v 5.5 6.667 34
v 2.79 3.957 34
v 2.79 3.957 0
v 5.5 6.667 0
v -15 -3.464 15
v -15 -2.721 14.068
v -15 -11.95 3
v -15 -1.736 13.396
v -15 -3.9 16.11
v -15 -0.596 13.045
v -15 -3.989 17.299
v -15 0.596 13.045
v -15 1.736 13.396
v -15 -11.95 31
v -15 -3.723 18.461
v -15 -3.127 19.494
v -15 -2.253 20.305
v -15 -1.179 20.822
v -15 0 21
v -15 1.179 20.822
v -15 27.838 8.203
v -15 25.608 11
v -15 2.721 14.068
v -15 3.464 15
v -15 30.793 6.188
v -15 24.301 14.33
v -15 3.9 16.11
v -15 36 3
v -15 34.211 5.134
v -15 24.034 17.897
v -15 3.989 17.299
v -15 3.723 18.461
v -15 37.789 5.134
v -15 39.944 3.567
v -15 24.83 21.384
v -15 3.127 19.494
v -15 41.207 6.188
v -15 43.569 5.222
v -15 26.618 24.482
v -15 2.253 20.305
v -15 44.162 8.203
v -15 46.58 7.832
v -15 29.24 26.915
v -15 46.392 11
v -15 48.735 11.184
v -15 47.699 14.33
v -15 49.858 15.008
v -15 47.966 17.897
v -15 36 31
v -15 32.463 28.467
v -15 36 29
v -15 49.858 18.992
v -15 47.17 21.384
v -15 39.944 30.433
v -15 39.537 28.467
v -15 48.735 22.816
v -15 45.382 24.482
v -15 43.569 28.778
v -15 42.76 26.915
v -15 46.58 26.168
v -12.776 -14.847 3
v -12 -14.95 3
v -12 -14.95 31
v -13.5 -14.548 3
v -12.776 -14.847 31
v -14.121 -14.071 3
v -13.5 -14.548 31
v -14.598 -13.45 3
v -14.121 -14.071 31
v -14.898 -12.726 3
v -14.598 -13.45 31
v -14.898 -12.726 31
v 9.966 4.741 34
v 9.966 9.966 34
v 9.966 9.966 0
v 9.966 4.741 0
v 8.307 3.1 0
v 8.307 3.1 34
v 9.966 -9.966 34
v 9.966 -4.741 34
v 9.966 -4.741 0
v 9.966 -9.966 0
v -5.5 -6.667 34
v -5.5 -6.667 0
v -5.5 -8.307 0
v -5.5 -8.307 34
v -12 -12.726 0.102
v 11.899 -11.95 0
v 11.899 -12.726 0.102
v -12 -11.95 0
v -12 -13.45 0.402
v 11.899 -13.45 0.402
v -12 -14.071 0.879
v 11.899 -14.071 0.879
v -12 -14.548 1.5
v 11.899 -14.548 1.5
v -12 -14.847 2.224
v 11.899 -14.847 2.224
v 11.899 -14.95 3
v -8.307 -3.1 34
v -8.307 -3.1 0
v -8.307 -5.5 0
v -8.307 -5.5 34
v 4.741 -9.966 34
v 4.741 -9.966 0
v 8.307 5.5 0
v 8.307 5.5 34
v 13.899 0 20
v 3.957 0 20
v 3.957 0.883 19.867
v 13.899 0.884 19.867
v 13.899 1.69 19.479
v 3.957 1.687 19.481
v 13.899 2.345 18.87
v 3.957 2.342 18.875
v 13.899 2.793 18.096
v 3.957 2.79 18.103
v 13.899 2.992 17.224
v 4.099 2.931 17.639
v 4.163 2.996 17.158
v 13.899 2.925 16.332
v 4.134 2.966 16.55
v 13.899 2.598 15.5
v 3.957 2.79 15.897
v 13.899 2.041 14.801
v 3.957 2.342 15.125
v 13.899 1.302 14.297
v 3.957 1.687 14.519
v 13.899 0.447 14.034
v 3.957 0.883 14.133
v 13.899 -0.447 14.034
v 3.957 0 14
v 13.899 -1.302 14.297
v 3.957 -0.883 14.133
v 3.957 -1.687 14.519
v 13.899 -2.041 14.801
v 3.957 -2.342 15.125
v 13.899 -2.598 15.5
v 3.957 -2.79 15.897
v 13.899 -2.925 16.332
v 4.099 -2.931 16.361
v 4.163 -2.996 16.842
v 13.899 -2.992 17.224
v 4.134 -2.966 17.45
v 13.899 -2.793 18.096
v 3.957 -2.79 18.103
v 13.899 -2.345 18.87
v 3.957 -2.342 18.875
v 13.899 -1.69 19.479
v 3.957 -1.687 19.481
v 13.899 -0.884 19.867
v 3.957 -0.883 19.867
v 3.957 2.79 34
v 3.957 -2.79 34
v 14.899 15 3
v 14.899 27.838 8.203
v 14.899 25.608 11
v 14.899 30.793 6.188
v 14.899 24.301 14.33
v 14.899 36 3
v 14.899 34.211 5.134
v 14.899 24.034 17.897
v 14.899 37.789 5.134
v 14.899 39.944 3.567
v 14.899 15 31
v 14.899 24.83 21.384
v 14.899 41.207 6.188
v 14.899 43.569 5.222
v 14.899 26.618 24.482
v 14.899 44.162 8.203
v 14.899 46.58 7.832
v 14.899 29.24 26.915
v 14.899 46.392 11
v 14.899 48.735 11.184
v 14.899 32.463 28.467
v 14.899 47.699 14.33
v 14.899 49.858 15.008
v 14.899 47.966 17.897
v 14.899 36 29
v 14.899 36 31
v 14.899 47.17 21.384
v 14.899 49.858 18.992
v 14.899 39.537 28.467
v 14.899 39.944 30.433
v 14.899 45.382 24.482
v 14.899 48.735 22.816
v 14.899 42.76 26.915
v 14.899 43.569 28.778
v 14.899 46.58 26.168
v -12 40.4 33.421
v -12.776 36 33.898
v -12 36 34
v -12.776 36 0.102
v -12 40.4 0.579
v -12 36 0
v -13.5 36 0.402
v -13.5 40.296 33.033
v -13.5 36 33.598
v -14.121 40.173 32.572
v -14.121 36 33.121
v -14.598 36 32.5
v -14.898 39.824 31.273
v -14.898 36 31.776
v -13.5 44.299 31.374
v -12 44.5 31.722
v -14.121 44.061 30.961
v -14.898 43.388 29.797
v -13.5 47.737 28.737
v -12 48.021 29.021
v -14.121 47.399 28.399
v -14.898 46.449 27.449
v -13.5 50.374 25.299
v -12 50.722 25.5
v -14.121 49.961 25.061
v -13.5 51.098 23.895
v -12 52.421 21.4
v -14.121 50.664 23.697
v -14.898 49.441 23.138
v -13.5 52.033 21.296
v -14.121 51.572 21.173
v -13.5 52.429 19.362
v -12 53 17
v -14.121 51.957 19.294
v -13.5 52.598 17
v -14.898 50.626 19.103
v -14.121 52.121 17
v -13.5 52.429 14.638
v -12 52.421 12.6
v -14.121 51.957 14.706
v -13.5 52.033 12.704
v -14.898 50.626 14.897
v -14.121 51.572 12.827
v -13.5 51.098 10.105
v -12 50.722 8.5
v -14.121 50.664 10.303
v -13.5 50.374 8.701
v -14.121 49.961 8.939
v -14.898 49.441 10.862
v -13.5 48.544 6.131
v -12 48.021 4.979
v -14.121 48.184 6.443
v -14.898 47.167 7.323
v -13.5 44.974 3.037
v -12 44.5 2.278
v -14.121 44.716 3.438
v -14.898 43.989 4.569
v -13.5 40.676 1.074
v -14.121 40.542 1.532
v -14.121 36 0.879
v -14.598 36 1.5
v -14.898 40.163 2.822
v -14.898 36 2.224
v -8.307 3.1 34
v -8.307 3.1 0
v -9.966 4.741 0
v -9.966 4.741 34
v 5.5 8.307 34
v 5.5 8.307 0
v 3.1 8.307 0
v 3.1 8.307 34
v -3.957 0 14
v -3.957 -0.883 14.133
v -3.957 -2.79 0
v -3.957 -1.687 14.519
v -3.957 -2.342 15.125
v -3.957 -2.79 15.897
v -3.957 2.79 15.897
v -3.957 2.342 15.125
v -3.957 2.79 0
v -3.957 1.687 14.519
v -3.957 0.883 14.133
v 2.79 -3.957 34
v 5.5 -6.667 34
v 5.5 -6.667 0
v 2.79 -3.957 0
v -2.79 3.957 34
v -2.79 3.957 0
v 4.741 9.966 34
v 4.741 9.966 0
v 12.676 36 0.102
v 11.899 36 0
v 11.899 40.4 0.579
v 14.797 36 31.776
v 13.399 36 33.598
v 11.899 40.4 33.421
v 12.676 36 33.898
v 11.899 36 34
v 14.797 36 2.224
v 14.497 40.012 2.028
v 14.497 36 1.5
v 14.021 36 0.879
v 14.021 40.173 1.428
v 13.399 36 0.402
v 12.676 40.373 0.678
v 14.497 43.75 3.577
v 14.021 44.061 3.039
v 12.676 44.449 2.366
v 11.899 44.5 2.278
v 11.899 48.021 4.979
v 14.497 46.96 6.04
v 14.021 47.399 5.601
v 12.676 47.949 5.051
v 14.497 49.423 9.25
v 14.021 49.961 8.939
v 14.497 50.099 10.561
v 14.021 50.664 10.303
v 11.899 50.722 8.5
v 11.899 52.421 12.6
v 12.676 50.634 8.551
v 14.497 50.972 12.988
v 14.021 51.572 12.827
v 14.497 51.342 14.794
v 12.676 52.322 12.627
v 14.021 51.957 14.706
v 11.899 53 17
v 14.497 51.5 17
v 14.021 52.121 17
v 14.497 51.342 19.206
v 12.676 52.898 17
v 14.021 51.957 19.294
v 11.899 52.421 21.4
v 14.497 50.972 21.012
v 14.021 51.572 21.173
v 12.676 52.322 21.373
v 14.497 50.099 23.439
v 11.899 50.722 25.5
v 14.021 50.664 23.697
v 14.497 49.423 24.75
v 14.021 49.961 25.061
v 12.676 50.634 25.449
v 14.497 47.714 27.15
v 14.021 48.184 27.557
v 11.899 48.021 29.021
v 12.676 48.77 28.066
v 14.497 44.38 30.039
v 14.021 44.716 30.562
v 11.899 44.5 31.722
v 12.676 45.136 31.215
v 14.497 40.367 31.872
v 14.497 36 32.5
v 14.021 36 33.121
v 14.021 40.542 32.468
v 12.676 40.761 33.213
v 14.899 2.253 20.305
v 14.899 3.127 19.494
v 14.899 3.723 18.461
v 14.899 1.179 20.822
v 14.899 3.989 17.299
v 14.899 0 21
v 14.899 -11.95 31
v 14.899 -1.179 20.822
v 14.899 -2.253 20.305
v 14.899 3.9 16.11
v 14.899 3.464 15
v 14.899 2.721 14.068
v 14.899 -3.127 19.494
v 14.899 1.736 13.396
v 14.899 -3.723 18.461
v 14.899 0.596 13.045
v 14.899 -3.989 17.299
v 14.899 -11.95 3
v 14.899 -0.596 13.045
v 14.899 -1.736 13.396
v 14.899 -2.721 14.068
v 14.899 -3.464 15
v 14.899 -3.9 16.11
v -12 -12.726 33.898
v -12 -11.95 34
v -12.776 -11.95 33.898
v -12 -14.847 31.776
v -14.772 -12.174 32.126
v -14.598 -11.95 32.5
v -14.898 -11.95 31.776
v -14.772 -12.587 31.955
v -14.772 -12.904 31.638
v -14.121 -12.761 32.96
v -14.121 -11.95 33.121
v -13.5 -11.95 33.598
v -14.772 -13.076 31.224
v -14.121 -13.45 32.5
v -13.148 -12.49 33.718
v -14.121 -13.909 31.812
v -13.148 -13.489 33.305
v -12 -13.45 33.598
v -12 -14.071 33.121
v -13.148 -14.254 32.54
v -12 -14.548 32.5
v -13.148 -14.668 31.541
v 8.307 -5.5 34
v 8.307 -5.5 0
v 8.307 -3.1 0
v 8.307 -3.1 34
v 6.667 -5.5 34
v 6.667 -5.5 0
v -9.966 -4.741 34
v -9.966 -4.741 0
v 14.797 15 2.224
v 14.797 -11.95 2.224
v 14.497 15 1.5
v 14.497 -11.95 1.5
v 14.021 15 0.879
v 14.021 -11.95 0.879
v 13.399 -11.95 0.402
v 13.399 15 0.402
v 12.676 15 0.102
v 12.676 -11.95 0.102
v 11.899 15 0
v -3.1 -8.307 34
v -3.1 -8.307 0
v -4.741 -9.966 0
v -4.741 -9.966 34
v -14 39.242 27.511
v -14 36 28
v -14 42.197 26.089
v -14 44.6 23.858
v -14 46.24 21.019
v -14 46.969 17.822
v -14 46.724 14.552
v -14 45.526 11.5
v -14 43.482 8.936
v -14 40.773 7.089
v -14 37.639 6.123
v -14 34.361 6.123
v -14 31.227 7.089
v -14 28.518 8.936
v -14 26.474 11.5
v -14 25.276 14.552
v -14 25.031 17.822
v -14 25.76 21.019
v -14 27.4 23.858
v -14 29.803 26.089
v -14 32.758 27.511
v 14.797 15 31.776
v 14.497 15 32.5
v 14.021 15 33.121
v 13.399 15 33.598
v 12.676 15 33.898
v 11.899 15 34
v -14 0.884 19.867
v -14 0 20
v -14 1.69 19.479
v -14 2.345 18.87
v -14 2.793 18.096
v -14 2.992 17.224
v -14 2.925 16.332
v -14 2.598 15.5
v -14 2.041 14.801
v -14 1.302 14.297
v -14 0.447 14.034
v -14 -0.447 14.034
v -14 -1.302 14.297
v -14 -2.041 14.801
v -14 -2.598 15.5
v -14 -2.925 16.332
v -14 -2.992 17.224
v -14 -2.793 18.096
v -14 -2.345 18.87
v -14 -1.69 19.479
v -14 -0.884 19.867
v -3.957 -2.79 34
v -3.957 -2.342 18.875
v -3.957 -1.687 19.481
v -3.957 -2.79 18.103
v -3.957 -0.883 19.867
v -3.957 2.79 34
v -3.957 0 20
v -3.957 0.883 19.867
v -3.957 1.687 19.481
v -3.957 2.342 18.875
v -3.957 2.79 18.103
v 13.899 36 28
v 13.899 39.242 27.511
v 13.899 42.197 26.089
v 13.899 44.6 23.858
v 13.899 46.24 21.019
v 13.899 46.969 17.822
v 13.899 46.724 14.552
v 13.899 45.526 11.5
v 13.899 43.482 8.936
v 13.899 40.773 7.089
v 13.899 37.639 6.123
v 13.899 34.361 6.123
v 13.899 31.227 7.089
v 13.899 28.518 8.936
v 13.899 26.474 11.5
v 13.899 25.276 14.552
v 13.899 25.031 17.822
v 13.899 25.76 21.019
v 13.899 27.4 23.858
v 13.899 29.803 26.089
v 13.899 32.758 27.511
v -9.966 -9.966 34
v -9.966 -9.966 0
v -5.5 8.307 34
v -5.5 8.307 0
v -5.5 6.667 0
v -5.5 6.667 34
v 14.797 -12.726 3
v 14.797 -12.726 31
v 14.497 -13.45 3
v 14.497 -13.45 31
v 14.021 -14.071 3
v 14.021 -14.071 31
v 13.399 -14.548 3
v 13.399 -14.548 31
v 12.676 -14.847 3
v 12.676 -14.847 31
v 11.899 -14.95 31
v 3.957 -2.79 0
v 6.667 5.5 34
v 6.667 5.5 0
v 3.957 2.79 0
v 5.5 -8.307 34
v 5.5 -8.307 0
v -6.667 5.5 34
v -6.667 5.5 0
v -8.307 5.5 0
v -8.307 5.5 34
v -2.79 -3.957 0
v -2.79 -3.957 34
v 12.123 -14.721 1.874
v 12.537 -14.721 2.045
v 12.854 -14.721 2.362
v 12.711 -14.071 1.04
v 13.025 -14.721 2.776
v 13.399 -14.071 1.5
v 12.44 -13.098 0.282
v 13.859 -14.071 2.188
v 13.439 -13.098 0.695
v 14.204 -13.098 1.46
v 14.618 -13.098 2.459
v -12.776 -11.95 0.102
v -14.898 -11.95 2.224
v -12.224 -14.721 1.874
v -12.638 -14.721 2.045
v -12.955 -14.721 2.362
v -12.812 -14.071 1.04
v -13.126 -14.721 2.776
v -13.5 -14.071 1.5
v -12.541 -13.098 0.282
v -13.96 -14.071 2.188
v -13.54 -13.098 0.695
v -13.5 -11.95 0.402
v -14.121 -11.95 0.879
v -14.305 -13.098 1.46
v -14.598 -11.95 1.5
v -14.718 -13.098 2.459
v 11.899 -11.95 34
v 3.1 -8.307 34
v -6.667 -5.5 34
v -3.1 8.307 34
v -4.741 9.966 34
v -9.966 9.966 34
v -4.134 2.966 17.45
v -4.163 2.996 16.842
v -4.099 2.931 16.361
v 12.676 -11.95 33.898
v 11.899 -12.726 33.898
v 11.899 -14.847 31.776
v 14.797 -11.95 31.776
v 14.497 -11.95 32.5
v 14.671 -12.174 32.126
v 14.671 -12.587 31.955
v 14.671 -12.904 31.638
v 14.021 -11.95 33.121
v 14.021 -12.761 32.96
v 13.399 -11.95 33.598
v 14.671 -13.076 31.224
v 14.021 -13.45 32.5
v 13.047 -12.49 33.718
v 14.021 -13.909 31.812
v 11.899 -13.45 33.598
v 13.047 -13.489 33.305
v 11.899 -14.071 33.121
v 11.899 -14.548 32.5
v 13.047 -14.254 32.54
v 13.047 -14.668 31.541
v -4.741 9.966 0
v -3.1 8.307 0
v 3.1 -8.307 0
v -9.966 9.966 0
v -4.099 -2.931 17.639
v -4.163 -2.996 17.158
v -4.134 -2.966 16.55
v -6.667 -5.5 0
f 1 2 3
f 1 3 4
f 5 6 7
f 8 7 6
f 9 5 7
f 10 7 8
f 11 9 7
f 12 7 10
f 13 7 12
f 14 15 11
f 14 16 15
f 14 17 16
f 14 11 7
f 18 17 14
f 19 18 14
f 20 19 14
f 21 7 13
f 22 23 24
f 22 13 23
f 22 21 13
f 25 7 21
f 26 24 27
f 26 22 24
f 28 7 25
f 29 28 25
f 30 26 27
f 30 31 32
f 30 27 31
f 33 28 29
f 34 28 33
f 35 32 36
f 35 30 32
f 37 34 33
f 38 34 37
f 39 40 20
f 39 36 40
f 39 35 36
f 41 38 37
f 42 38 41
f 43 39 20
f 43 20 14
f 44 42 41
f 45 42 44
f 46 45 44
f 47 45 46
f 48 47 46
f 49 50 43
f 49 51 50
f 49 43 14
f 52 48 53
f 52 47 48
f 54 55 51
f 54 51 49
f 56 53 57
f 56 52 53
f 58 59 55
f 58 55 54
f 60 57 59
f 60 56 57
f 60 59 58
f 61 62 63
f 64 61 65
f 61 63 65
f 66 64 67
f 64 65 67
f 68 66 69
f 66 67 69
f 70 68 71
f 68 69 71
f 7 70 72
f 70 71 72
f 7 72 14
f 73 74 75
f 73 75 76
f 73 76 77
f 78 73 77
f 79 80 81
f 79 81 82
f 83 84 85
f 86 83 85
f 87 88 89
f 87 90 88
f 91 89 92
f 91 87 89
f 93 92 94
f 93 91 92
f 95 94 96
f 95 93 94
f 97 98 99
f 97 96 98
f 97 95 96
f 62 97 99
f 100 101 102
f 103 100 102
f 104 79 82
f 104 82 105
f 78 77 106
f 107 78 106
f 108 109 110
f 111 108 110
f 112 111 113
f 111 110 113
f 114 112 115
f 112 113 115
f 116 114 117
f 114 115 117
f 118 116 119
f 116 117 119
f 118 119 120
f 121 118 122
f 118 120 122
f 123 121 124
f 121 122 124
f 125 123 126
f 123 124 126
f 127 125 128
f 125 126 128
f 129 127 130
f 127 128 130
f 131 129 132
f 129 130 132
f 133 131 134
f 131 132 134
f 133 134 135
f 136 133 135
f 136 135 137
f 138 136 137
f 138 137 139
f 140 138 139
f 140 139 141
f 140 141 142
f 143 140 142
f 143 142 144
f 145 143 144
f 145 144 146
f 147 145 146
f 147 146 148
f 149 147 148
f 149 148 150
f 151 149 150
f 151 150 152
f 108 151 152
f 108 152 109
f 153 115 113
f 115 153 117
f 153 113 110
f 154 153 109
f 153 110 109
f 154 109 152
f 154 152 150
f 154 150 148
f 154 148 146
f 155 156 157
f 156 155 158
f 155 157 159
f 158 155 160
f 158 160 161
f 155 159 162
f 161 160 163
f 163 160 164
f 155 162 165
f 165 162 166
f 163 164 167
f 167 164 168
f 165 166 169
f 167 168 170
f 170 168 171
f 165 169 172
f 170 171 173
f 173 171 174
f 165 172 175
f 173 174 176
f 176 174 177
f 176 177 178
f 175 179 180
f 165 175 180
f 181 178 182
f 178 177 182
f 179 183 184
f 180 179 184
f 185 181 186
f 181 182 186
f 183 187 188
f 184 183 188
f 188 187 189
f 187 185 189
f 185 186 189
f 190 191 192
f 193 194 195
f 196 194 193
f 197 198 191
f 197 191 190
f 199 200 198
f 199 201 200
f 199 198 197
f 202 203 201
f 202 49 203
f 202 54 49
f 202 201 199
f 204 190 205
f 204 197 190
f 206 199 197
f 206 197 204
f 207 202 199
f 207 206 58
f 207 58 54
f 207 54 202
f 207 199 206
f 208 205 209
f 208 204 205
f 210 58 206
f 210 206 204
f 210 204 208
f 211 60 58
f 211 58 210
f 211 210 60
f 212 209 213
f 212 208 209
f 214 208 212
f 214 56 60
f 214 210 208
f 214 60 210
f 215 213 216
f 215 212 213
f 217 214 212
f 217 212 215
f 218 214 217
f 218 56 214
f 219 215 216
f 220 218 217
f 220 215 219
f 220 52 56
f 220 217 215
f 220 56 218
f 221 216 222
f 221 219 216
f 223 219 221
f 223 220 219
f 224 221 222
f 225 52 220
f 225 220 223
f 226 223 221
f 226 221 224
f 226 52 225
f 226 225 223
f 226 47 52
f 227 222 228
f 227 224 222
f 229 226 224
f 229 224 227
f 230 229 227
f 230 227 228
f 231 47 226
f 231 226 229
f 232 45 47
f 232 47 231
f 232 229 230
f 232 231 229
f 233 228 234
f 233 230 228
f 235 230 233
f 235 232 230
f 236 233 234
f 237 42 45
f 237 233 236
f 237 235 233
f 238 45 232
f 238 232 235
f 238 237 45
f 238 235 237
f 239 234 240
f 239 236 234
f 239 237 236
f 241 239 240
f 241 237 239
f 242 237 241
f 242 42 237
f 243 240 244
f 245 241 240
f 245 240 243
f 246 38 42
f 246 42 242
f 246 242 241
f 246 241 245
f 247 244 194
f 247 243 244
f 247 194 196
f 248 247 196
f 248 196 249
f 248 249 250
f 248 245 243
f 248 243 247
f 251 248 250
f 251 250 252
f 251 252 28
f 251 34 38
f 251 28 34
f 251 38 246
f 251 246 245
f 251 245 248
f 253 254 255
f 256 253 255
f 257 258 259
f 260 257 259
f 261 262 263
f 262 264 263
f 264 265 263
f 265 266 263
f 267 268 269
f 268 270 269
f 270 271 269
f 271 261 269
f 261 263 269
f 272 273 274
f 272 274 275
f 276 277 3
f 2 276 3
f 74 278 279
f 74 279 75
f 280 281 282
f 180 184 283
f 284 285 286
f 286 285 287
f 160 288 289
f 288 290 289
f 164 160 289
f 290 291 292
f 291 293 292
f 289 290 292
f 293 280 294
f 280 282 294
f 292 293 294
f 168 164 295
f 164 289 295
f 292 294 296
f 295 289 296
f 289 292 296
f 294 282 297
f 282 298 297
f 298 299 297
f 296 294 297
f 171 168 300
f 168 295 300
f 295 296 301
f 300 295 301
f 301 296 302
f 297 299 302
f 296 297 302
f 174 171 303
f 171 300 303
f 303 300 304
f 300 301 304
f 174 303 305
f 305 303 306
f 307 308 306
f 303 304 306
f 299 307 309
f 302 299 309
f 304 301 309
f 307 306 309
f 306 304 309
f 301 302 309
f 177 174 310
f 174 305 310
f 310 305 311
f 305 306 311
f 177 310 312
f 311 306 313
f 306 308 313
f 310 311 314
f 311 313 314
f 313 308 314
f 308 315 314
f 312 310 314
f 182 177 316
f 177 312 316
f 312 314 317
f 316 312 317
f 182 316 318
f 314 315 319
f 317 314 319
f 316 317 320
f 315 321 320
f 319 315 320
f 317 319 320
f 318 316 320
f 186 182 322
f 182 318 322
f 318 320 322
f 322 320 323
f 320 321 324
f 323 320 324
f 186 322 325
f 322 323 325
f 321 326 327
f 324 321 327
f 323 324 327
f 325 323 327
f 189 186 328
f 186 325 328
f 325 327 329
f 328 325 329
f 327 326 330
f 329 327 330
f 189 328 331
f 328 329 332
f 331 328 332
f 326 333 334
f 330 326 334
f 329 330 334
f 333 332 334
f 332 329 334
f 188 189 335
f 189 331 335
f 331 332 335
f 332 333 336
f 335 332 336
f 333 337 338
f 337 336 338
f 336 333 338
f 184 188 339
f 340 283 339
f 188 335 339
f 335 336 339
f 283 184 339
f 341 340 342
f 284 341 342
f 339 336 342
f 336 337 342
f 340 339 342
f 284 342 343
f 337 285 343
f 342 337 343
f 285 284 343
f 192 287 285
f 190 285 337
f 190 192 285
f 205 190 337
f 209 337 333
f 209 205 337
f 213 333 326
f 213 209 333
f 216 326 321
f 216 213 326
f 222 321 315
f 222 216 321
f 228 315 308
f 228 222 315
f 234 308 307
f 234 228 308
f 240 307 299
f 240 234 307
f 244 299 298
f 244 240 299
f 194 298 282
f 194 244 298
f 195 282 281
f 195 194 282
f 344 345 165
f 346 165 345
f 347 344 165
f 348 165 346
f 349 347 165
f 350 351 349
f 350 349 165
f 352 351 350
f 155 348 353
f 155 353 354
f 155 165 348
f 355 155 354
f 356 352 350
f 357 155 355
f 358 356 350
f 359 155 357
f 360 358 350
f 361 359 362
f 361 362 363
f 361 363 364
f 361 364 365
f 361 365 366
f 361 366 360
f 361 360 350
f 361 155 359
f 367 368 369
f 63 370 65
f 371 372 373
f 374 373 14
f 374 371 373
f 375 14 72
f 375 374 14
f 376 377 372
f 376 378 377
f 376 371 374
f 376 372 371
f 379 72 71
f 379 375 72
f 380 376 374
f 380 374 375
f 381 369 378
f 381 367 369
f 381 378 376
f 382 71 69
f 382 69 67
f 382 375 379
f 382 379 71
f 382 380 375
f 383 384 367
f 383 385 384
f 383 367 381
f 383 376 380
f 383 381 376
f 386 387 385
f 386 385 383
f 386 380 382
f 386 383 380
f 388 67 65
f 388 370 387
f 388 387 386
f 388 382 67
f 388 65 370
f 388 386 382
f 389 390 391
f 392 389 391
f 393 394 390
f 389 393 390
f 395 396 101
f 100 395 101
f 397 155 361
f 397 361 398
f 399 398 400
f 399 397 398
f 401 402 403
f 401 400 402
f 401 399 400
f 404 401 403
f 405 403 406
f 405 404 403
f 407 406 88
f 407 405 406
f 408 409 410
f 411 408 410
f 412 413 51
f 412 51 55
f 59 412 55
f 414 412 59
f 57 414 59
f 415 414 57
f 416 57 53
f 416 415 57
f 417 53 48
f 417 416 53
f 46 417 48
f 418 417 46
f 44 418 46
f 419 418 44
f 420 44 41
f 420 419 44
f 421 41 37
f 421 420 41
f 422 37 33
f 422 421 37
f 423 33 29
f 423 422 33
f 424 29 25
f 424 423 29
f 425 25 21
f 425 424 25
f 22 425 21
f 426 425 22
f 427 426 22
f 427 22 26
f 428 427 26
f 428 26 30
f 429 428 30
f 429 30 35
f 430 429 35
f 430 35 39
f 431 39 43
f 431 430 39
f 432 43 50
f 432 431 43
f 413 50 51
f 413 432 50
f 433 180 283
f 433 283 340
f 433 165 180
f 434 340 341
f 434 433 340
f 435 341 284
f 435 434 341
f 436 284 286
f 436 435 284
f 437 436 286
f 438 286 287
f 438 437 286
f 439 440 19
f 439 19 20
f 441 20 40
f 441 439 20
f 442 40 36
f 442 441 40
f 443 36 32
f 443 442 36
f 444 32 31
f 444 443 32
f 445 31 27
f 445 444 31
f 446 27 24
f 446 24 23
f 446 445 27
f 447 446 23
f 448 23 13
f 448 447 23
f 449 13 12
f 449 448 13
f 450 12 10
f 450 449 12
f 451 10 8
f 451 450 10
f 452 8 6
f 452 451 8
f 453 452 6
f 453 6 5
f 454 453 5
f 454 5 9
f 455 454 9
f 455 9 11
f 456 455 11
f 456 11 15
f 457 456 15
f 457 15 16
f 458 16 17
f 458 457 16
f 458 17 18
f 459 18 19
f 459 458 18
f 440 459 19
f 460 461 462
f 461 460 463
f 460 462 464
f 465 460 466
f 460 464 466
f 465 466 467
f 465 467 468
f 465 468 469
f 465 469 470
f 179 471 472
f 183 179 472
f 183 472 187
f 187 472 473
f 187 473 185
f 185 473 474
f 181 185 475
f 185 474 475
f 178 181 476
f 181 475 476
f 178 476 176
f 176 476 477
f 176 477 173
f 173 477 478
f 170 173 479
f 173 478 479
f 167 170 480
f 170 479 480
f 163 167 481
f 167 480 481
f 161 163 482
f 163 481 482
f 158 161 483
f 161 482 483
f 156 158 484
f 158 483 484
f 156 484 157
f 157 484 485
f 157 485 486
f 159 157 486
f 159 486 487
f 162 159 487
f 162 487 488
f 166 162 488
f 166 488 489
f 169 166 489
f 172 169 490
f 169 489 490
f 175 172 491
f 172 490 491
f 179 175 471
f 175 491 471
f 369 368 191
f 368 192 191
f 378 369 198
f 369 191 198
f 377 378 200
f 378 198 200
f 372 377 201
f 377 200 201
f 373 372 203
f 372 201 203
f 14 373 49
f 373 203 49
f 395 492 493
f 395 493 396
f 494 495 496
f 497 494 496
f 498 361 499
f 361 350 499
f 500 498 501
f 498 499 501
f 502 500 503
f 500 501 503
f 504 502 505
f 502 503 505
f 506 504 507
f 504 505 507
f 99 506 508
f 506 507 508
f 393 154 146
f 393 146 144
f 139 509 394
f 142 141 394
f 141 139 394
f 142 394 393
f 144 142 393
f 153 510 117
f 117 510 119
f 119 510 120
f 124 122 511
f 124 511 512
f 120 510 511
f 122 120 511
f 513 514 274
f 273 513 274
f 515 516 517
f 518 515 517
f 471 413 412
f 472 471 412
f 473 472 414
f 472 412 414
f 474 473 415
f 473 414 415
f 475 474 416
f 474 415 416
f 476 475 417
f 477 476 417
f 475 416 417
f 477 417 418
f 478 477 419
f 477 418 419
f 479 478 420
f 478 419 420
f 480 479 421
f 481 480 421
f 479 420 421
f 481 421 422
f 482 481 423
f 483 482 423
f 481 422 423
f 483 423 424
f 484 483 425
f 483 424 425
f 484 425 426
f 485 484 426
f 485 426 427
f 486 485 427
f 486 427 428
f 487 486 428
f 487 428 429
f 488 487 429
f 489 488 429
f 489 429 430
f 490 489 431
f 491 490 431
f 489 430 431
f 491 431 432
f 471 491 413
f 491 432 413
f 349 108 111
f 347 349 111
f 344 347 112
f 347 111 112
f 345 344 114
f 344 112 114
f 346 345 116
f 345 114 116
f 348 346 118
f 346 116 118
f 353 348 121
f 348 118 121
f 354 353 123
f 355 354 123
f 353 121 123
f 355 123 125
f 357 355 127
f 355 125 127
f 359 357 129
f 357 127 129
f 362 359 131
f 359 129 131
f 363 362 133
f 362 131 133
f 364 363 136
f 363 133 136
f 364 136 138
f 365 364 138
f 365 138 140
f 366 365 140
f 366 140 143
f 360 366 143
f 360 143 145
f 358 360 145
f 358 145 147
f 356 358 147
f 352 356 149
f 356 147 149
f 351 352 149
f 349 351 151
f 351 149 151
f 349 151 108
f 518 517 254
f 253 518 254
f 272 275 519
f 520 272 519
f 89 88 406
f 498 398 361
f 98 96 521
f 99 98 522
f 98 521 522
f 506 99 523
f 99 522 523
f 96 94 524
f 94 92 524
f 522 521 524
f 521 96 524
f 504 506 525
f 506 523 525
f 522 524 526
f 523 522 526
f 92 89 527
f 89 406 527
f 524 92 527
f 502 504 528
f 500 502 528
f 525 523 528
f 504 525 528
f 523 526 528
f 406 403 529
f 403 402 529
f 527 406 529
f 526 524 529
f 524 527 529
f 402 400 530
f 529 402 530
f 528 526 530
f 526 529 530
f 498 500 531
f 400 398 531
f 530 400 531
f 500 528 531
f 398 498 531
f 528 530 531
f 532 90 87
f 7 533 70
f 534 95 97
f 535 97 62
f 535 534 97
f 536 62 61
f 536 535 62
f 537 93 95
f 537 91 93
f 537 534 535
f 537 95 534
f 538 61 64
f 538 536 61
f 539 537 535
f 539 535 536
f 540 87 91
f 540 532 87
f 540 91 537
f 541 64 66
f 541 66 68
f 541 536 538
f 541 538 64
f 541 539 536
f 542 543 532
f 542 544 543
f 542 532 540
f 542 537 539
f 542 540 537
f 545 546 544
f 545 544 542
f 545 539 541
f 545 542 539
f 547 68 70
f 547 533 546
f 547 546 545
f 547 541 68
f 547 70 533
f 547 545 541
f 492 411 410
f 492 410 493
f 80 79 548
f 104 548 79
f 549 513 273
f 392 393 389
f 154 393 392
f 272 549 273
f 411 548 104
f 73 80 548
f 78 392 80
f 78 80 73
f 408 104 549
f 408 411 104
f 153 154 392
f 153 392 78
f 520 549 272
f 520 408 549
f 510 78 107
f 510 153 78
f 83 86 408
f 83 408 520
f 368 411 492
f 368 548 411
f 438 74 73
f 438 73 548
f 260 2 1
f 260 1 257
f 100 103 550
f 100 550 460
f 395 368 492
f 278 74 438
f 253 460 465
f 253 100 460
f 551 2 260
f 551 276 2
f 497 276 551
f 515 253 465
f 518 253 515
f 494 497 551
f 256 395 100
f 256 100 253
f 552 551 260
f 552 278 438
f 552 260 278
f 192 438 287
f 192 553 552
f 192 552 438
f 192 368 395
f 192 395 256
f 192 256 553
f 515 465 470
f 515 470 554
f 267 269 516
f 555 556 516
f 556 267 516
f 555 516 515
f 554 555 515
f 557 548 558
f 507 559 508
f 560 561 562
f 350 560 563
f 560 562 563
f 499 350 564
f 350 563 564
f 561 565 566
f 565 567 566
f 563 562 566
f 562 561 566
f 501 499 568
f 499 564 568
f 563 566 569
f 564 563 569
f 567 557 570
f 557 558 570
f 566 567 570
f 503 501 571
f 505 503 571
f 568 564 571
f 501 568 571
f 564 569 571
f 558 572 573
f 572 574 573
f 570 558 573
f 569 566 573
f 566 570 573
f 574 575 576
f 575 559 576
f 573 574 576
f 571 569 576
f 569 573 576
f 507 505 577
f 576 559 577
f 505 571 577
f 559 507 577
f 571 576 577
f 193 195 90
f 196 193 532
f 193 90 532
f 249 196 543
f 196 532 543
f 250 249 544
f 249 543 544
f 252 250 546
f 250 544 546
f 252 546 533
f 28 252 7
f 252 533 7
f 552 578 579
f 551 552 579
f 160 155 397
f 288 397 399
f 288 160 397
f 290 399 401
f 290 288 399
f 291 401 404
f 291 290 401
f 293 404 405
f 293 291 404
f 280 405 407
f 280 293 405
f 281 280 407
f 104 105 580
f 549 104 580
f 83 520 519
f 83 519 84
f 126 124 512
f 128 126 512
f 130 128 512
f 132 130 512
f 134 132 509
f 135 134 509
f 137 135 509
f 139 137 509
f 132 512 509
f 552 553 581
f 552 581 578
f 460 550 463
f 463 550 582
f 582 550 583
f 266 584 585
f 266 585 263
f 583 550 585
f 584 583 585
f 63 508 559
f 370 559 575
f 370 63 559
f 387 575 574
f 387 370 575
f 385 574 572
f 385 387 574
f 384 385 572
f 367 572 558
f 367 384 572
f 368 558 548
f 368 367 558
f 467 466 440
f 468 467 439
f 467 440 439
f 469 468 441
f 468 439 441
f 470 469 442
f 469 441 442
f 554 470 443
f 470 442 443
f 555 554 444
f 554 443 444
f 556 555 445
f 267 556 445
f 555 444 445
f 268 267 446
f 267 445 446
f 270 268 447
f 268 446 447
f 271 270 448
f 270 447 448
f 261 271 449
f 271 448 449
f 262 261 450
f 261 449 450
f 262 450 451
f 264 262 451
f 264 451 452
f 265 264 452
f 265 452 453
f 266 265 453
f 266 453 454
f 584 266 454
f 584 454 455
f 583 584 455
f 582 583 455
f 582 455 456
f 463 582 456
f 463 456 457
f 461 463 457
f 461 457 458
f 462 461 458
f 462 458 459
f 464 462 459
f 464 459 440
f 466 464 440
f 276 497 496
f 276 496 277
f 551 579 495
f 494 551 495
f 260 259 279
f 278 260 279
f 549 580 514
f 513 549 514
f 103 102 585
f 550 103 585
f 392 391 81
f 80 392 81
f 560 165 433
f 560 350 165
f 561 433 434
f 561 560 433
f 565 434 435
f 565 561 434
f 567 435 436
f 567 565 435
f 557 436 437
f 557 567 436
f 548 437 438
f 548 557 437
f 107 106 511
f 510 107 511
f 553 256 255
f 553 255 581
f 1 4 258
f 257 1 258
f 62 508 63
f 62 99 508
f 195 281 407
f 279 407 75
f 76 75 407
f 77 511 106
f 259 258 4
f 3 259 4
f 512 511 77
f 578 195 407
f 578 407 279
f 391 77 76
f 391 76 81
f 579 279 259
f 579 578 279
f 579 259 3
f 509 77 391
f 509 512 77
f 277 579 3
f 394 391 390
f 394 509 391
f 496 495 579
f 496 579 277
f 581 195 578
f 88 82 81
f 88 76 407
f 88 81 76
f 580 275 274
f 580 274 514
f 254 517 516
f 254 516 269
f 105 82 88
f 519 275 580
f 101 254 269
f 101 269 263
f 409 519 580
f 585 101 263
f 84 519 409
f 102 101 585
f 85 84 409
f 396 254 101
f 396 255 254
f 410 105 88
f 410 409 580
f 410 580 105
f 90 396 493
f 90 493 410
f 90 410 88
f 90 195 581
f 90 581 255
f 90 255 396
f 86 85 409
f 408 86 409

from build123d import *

# Parameters (mm, degrees)
BOSS_EXTRUDE1_DEPTH = 34
SKETCH5_R           = 11
BOSS_EXTRUDE3_DEPTH = 29.899298
SKETCH3_R           = 3
CUT_EXTRUDE1_DEPTH  = 30.899298428
FILLET1_R           = 3
CHAMFER1_SIZE       = 1


with BuildPart() as part:
    # Sketch1 → Boss-Extrude1 (new body)
    with BuildSketch(Plane.XY):
        Polygon((0, 15), (14.899298428, 15), (14.899298428, -14.949649214), (-15, -14.949649214), (-15, 15), align=None)
        Polygon((-9.966432809, 9.966432809), (-4.741432809, 9.966432809), (-3.1, 8.307461143), (-5.5, 8.307461143), (-5.5, 6.667461143), (-2.79, 3.957461143), (2.79, 3.957461143), (5.5, 6.667461143), (5.5, 8.307461143), (3.1, 8.307461143), (4.741432809, 9.966432809), (9.966432809, 9.966432809), (9.966432809, 4.741432809), (8.307461143, 3.1), (8.307461143, 5.5), (6.667461143, 5.5), (3.957461143, 2.79), (3.957461143, -2.79), (6.667461143, -5.5), (8.307461143, -5.5), (8.307461143, -3.1), (9.966432809, -4.741432809), (9.966432809, -9.966432809), (4.741432809, -9.966432809), (3.1, -8.307461143), (5.5, -8.307461143), (5.5, -6.667461143), (2.79, -3.957461143), (-2.79, -3.957461143), (-5.5, -6.667461143), (-5.5, -8.307461143), (-3.1, -8.307461143), (-4.741432809, -9.966432809), (-9.966432809, -9.966432809), (-9.966432809, -4.741432809), (-8.307461143, -3.1), (-8.307461143, -5.5), (-6.667461143, -5.5), (-3.957461143, -2.79), (-3.957461143, 2.79), (-6.667461143, 5.5), (-8.307461143, 5.5), (-8.307461143, 3.1), (-9.966432809, 4.741432809), align=None, mode=Mode.SUBTRACT)
    extrude(amount=BOSS_EXTRUDE1_DEPTH)

    # Sketch5 → Boss-Extrude3 (add, through all)
    with BuildSketch(Plane.ZY.offset(15)):
        with BuildLine():
            Line((0, 36), (0, 15))
            Line((0, 15), (0, 12.8756905))
            Line((0, 12.8756905), (34, 12.8756905))
            Line((34, 12.8756905), (34, 36))
            ThreePointArc((34, 36), (17, 53), (0, 36))
        make_face()
        with Locations((17, 36)):
            Circle(SKETCH5_R, mode=Mode.SUBTRACT)
    extrude(amount=-BOSS_EXTRUDE3_DEPTH)

    # Sketch3 → Cut-Extrude1 (cut, through all)
    with BuildSketch(Plane.ZY.offset(15)):
        with Locations((17, 0)):
            Circle(SKETCH3_R)
    extrude(amount=-CUT_EXTRUDE1_DEPTH, mode=Mode.SUBTRACT)

    # Fillet1
    fillet1_edges = [part.edges().sort_by_distance(p)[0] for p in [
        (-0.050350786, -14.949649214, 34),
        (14.899298428, 0.025175393, 34),
        (-15, 53, 17),
        (14.899298, 53, 17),
        (14.899298428, 0.025175393, 0),
        (-0.050350786, -14.949649214, 0),
        (-15, 10.525175393, 0),
        (-15, 10.525175393, 34),
        (14.899298428, -14.949649214, 17),
        (-15, -14.949649214, 17),
    ]]
    fillet(fillet1_edges, radius=FILLET1_R)

    # Chamfer1
    chamfer1_edges = [part.edges().sort_by_distance(p)[0] for p in [
        (14.899298, 36, 6),
        (-15, 36, 6),
        (14.899298428, 0, 14),
        (-15, 0, 14),
    ]]
    chamfer(chamfer1_edges, length=CHAMFER1_SIZE)


solid = part.part
